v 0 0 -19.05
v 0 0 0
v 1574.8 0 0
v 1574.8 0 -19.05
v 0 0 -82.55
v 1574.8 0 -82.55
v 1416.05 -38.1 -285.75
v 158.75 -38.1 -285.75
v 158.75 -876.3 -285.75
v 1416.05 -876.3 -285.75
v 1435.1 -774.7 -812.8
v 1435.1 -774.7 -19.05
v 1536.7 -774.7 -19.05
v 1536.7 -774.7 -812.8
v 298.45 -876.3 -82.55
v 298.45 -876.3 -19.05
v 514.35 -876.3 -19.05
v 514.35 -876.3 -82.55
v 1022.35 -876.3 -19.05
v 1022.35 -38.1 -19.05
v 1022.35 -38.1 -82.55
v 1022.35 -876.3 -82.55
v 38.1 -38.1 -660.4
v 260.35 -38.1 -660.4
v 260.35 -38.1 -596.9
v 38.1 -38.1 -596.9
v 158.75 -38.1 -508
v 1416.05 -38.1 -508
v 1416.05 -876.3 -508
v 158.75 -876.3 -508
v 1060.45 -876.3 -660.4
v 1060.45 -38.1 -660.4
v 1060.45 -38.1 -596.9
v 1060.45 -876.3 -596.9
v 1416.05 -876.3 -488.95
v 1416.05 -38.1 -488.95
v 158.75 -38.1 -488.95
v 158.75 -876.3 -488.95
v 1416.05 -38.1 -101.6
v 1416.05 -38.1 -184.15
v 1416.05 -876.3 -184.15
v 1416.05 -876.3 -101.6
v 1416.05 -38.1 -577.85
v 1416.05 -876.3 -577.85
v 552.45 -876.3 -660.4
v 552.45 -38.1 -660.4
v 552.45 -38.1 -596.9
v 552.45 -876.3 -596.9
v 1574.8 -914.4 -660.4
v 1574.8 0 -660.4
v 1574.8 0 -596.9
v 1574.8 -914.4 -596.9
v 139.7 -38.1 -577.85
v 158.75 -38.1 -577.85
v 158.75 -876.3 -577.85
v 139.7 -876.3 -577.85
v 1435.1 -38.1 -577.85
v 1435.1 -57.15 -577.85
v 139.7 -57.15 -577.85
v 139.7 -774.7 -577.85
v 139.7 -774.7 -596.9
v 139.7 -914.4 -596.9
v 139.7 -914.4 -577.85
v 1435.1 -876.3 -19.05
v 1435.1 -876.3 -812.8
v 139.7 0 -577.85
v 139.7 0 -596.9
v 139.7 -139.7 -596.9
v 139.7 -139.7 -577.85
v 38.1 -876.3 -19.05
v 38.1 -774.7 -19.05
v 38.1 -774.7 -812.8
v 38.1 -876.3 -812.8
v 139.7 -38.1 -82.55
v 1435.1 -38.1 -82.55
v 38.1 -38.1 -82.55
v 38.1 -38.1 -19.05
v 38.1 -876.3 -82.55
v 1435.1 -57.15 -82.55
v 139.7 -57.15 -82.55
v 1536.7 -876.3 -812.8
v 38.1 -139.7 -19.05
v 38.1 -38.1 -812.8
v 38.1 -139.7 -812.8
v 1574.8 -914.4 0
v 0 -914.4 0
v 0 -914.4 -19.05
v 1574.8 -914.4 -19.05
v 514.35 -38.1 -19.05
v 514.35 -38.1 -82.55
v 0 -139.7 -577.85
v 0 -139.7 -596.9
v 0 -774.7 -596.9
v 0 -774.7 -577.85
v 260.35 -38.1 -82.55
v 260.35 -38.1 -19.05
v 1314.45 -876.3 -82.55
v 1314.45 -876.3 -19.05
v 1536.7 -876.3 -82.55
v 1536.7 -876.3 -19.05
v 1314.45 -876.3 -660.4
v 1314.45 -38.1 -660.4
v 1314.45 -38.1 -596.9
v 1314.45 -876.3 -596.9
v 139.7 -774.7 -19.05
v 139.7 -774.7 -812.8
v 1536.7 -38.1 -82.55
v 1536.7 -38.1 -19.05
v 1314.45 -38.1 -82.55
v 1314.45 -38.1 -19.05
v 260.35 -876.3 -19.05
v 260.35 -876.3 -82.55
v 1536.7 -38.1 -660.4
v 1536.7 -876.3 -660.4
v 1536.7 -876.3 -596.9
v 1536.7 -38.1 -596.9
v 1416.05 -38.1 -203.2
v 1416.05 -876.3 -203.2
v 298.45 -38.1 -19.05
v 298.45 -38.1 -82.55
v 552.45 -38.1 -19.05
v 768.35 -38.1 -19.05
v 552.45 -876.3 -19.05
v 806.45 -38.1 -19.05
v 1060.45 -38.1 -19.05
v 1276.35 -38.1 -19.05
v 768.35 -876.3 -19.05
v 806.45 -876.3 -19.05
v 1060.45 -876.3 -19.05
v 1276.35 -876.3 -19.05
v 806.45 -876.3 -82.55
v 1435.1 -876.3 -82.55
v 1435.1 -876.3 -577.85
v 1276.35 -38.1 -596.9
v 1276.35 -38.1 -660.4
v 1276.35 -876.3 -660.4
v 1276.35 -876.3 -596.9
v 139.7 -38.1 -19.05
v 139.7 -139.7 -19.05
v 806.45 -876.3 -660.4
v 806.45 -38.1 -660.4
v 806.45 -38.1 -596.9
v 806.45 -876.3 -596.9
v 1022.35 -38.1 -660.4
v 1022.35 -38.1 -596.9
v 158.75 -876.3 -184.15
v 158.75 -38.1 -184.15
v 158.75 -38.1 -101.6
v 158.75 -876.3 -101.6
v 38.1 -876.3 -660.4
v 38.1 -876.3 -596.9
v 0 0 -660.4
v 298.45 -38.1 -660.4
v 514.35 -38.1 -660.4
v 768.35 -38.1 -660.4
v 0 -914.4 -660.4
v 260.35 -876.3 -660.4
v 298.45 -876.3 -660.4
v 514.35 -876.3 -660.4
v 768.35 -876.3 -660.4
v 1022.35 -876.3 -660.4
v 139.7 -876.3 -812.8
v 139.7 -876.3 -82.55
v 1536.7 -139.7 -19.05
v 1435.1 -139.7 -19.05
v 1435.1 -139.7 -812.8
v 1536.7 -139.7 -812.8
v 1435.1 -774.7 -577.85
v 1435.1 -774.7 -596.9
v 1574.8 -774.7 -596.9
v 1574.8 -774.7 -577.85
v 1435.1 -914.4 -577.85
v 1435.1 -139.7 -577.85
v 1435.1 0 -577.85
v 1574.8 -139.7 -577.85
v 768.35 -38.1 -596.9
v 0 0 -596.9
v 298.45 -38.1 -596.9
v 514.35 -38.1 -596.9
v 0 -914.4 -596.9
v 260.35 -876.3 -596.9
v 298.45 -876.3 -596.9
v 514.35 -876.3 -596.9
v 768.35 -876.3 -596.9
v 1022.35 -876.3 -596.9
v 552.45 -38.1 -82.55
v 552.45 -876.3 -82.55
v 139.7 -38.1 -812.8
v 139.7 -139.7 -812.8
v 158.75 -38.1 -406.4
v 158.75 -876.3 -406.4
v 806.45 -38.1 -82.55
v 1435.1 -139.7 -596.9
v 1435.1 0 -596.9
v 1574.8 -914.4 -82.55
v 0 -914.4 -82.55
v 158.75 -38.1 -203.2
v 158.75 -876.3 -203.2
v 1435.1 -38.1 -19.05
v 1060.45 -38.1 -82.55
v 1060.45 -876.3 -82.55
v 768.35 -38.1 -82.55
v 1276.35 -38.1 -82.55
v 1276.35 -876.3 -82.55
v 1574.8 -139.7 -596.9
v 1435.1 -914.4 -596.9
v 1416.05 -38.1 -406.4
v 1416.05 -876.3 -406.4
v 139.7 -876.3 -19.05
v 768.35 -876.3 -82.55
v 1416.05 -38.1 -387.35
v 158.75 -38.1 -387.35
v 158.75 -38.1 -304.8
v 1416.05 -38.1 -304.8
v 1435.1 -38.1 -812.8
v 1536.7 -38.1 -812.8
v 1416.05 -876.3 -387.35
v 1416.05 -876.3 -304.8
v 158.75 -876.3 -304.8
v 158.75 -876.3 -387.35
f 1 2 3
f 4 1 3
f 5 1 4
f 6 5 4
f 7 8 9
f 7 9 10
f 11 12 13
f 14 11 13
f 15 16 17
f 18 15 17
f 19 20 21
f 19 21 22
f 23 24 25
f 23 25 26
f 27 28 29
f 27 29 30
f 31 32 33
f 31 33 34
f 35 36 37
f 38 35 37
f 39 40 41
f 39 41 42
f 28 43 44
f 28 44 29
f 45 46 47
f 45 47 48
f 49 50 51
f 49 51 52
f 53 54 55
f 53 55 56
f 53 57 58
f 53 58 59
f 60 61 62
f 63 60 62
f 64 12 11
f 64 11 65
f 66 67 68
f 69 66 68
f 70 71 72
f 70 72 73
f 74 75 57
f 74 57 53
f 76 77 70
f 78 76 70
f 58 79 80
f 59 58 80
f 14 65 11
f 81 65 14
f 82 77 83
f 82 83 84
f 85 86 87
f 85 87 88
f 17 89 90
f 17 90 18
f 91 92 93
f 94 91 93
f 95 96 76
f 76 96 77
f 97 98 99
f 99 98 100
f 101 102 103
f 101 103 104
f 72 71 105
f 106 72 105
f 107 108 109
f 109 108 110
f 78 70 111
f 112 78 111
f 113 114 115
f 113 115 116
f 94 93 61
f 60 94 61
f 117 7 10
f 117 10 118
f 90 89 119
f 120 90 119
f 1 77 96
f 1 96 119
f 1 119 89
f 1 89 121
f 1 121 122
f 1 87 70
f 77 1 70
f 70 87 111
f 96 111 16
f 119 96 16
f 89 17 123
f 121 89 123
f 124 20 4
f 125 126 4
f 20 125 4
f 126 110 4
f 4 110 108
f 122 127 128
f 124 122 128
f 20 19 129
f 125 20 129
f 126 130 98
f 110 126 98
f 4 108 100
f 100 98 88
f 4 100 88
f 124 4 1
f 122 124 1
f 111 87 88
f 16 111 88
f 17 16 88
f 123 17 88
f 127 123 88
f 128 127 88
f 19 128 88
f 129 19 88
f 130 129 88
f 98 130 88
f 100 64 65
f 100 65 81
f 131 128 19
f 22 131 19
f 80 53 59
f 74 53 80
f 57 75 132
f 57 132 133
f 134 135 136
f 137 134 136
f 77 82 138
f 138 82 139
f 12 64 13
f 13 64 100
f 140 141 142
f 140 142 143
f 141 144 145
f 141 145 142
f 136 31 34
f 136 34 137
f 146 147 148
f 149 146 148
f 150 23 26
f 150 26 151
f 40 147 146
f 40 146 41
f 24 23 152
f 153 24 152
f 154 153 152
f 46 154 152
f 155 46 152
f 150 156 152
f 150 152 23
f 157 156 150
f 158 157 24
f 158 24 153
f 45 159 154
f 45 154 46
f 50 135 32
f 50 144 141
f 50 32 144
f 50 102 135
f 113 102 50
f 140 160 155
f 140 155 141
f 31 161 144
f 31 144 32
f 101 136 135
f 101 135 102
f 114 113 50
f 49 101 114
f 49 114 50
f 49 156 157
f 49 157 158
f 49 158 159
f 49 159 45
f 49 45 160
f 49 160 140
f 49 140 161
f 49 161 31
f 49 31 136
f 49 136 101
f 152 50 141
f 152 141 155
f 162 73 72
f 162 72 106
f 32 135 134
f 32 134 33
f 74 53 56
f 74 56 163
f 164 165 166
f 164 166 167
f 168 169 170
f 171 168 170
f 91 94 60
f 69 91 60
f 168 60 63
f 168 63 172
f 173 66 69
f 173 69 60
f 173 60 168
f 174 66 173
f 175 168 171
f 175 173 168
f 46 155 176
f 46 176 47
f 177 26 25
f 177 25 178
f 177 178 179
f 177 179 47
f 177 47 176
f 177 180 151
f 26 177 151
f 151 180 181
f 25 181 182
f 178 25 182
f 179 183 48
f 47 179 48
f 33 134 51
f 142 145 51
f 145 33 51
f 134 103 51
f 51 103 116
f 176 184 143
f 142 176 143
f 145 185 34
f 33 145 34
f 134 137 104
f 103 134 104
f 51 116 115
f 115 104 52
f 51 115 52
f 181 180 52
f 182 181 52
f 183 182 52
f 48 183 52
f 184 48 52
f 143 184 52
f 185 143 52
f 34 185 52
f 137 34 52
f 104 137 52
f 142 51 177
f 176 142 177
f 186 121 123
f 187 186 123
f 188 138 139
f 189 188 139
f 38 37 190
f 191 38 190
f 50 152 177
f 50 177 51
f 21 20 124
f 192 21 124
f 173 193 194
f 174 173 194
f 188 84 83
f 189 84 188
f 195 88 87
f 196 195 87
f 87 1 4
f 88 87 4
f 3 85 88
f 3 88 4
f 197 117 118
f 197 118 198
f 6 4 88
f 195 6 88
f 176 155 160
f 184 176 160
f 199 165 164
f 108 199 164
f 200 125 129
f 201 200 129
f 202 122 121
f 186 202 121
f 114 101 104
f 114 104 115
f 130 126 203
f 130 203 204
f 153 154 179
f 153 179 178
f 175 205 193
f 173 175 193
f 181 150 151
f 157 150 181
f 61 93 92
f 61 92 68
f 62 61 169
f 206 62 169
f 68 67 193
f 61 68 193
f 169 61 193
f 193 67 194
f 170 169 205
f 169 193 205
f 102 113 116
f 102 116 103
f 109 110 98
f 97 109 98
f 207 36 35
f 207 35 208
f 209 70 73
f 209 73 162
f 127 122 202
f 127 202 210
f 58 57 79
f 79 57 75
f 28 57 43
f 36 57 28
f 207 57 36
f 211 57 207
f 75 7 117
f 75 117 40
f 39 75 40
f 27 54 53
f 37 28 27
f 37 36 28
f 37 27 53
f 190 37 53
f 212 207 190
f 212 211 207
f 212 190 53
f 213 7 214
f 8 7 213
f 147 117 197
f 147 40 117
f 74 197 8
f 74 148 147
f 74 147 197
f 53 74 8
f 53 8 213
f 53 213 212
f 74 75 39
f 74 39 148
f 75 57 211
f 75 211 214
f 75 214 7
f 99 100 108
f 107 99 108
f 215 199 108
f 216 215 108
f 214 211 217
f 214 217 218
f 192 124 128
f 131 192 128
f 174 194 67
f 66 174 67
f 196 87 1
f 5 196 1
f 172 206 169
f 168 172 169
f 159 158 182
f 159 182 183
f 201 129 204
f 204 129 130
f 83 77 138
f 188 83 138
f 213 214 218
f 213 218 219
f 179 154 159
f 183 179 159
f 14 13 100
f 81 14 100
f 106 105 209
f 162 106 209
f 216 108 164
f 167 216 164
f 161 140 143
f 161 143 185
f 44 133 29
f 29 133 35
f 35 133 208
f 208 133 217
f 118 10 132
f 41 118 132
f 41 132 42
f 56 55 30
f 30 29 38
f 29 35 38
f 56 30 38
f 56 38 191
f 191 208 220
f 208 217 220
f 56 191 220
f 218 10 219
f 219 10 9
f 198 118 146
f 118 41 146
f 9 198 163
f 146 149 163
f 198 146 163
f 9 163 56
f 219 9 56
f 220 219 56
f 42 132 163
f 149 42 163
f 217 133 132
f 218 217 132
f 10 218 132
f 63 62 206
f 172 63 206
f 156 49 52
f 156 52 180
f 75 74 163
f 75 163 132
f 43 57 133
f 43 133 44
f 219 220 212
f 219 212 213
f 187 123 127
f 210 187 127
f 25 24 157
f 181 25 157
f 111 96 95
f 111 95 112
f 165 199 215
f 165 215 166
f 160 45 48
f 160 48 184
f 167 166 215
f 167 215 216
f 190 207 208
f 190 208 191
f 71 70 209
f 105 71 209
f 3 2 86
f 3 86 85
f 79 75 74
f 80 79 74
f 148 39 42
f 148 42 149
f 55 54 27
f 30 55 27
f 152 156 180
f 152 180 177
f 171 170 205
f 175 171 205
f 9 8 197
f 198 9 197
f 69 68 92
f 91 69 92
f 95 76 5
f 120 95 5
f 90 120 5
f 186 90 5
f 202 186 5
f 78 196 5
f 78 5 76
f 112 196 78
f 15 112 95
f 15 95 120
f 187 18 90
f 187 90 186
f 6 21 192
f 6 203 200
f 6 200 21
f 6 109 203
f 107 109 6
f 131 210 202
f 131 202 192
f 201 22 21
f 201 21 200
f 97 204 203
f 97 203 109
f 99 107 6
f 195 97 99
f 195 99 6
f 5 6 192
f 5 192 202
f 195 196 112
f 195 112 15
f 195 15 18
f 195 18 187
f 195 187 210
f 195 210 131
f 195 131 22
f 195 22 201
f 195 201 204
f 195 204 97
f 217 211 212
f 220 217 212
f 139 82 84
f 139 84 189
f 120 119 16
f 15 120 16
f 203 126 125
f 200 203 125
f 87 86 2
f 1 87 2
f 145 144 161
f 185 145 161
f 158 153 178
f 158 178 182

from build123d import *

# Parameters (mm, degrees)
F0_W      = 1574.8
F0_H      = 914.4
F1_DEPTH  = 19.05
F2_W      = 38.1
F2_H      = 838.2
F3_DEPTH  = 63.5
F4_W      = 101.6
F4_H      = 101.6
F5_DEPTH  = 793.75
F7_W      = 38.1
F7_H      = 838.2
F8_DEPTH  = 63.5
F11_DEPTH = 19.05
F13_W     = 1257.3
F13_H     = 19.05
F13_W_2   = 19.05
F13_H_2   = 82.55
F13_H_3   = 69.85
F14_DEPTH = 838.2
F15_W     = 1295.4
F15_H     = 495.3
F16_DEPTH = 19.05


with BuildPart() as f1:
    # F0 (on Top) → F1 (new body)
    with BuildSketch(Plane.XY):
        with Locations((787.4, -457.2)):
            Rectangle(F0_W, F0_H)
    extrude(amount=-F1_DEPTH)


with BuildPart() as f3:
    # F2 (on face) → F3 (new body)
    with BuildSketch(Plane(origin=(0, 0, -19.05), x_dir=(1, 0, 0), z_dir=(0, 0, -1))):
        Polygon((38.1, 914.4), (0, 914.4), (0, 0), (38.1, 0), (38.1, 38.1), (38.1, 876.3), align=None)
        Polygon((1536.7, 914.4), (38.1, 914.4), (38.1, 876.3), (260.35, 876.3), (298.45, 876.3), (514.35, 876.3), (552.45, 876.3), (768.35, 876.3), (806.45, 876.3), (1022.35, 876.3), (1060.45, 876.3), (1276.35, 876.3), (1314.45, 876.3), (1536.7, 876.3), align=None)
        Polygon((1574.8, 914.4), (1536.7, 914.4), (1536.7, 876.3), (1536.7, 38.1), (1536.7, 0), (1574.8, 0), align=None)
        Polygon((38.1, 38.1), (38.1, 0), (1536.7, 0), (1536.7, 38.1), (1314.45, 38.1), (1276.35, 38.1), (1060.45, 38.1), (1022.35, 38.1), (806.45, 38.1), (768.35, 38.1), (552.45, 38.1), (514.35, 38.1), (298.45, 38.1), (260.35, 38.1), align=None)
        with Locations((279.4, 457.2)):
            Rectangle(F2_W, F2_H)
        with Locations((533.4, 457.2)):
            Rectangle(F2_W, F2_H)
        with Locations((787.4, 457.2)):
            Rectangle(F2_W, F2_H)
        with Locations((1041.4, 457.2)):
            Rectangle(F2_W, F2_H)
        with Locations((1295.4, 457.2)):
            Rectangle(F2_W, F2_H)
    extrude(amount=F3_DEPTH)


with BuildPart() as f5:
    # F4 (on face) → F5 (new body)
    with BuildSketch(Plane(origin=(0, 0, -19.05), x_dir=(1, 0, 0), z_dir=(0, 0, -1))):
        with Locations((88.9, 825.5)):
            Rectangle(F4_W, F4_H)
    extrude(amount=F5_DEPTH)


with BuildPart() as f5b:
    # F4 (on face) → F5, piece 2 (new body)
    with BuildSketch(Plane(origin=(0, 0, -19.05), x_dir=(1, 0, 0), z_dir=(0, 0, -1))):
        with Locations((1485.9, 825.5)):
            Rectangle(F4_W, F4_H)
    extrude(amount=F5_DEPTH)


with BuildPart() as f5c:
    # F4 (on face) → F5, piece 3 (new body)
    with BuildSketch(Plane(origin=(0, 0, -19.05), x_dir=(1, 0, 0), z_dir=(0, 0, -1))):
        with Locations((1485.9, 88.9)):
            Rectangle(F4_W, F4_H)
    extrude(amount=F5_DEPTH)


with BuildPart() as f5d:
    # F4 (on face) → F5, piece 4 (new body)
    with BuildSketch(Plane(origin=(0, 0, -19.05), x_dir=(1, 0, 0), z_dir=(0, 0, -1))):
        with Locations((88.9, 88.9)):
            Rectangle(F4_W, F4_H)
    extrude(amount=F5_DEPTH)


with BuildPart() as f8:
    # F7 (on offset) → F8 (new body)
    with BuildSketch(Plane(origin=(0, 0, -660.4), x_dir=(1, 0, 0), z_dir=(0, 0, -1))):
        with Locations((533.4, 457.2)):
            Rectangle(F7_W, F7_H)
        with Locations((787.4, 457.2)):
            Rectangle(F7_W, F7_H)
        with Locations((1041.4, 457.2)):
            Rectangle(F7_W, F7_H)
        with Locations((1295.4, 457.2)):
            Rectangle(F7_W, F7_H)
        Polygon((1574.8, 914.4), (1536.7, 914.4), (1536.7, 876.3), (1536.7, 38.1), (1536.7, 0), (1574.8, 0), align=None)
        Polygon((38.1, 38.1), (38.1, 0), (1536.7, 0), (1536.7, 38.1), (1314.45, 38.1), (1276.35, 38.1), (1060.45, 38.1), (1022.35, 38.1), (806.45, 38.1), (768.35, 38.1), (552.45, 38.1), (514.35, 38.1), (298.45, 38.1), (260.35, 38.1), align=None)
        Polygon((1536.7, 914.4), (38.1, 914.4), (38.1, 876.3), (260.35, 876.3), (298.45, 876.3), (514.35, 876.3), (552.45, 876.3), (768.35, 876.3), (806.45, 876.3), (1022.35, 876.3), (1060.45, 876.3), (1276.35, 876.3), (1314.45, 876.3), (1536.7, 876.3), align=None)
        with Locations((279.4, 457.2)):
            Rectangle(F7_W, F7_H)
        Polygon((38.1, 914.4), (0, 914.4), (0, 0), (38.1, 0), (38.1, 38.1), (38.1, 876.3), align=None)
    extrude(amount=-F8_DEPTH)


with BuildPart() as f11:
    # F10 (on face) → F11 (new body)
    with BuildSketch(Plane.XY.offset(-596.9)):
        Polygon((1435.1, 0), (139.7, 0), (139.7, -139.7), (0, -139.7), (0, -774.7), (139.7, -774.7), (139.7, -914.4), (1435.1, -914.4), (1435.1, -774.7), (1574.8, -774.7), (1574.8, -139.7), (1435.1, -139.7), align=None)
    extrude(amount=F11_DEPTH)


with BuildPart() as f14:
    # F13 (on offset) → F14 (new body)
    with BuildSketch(Plane(origin=(0, -38.1, 0), x_dir=(-1, 0, 0), z_dir=(0, 1, 0))):
        with Locations((-787.4, -193.675)):
            Rectangle(F13_W, F13_H)
        with Locations((-787.4, -295.275)):
            Rectangle(F13_W, F13_H)
        with Locations((-787.4, -396.875)):
            Rectangle(F13_W, F13_H)
        with Locations((-787.4, -498.475)):
            Rectangle(F13_W, F13_H)
        with Locations((-787.4, -92.075)):
            Rectangle(F13_W, F13_H)
        with Locations((-1425.575, -142.875)):
            Rectangle(F13_W_2, F13_H_2)
        with Locations((-1425.575, -92.075)):
            Rectangle(F13_W_2, F13_H)
        with Locations((-1425.575, -193.675)):
            Rectangle(F13_W_2, F13_H)
        with Locations((-1425.575, -244.475)):
            Rectangle(F13_W_2, F13_H_2)
        with Locations((-1425.575, -295.275)):
            Rectangle(F13_W_2, F13_H)
        with Locations((-1425.575, -346.075)):
            Rectangle(F13_W_2, F13_H_2)
        with Locations((-1425.575, -396.875)):
            Rectangle(F13_W_2, F13_H)
        with Locations((-1425.575, -447.675)):
            Rectangle(F13_W_2, F13_H_2)
        with Locations((-1425.575, -542.925)):
            Rectangle(F13_W_2, F13_H_3)
        with Locations((-1425.575, -498.475)):
            Rectangle(F13_W_2, F13_H)
        with Locations((-149.225, -542.925)):
            Rectangle(F13_W_2, F13_H_3)
        with Locations((-149.225, -447.675)):
            Rectangle(F13_W_2, F13_H_2)
        with Locations((-149.225, -346.075)):
            Rectangle(F13_W_2, F13_H_2)
        with Locations((-149.225, -498.475)):
            Rectangle(F13_W_2, F13_H)
        with Locations((-149.225, -396.875)):
            Rectangle(F13_W_2, F13_H)
        with Locations((-149.225, -295.275)):
            Rectangle(F13_W_2, F13_H)
        with Locations((-149.225, -244.475)):
            Rectangle(F13_W_2, F13_H_2)
        with Locations((-149.225, -193.675)):
            Rectangle(F13_W_2, F13_H)
        with Locations((-149.225, -142.875)):
            Rectangle(F13_W_2, F13_H_2)
        with Locations((-149.225, -92.075)):
            Rectangle(F13_W_2, F13_H)
    extrude(amount=-F14_DEPTH)


with BuildPart() as f16:
    # F15 (on face) → F16 (new body)
    with BuildSketch(Plane(origin=(0, -38.1, 0), x_dir=(-1, 0, 0), z_dir=(0, 1, 0))):
        with Locations((-787.4, -330.2)):
            Rectangle(F15_W, F15_H)
    extrude(amount=-F16_DEPTH)


solid = Compound([f1.part, f3.part, f5.part, f5b.part, f5c.part, f5d.part, f8.part, f11.part, f14.part, f16.part])
